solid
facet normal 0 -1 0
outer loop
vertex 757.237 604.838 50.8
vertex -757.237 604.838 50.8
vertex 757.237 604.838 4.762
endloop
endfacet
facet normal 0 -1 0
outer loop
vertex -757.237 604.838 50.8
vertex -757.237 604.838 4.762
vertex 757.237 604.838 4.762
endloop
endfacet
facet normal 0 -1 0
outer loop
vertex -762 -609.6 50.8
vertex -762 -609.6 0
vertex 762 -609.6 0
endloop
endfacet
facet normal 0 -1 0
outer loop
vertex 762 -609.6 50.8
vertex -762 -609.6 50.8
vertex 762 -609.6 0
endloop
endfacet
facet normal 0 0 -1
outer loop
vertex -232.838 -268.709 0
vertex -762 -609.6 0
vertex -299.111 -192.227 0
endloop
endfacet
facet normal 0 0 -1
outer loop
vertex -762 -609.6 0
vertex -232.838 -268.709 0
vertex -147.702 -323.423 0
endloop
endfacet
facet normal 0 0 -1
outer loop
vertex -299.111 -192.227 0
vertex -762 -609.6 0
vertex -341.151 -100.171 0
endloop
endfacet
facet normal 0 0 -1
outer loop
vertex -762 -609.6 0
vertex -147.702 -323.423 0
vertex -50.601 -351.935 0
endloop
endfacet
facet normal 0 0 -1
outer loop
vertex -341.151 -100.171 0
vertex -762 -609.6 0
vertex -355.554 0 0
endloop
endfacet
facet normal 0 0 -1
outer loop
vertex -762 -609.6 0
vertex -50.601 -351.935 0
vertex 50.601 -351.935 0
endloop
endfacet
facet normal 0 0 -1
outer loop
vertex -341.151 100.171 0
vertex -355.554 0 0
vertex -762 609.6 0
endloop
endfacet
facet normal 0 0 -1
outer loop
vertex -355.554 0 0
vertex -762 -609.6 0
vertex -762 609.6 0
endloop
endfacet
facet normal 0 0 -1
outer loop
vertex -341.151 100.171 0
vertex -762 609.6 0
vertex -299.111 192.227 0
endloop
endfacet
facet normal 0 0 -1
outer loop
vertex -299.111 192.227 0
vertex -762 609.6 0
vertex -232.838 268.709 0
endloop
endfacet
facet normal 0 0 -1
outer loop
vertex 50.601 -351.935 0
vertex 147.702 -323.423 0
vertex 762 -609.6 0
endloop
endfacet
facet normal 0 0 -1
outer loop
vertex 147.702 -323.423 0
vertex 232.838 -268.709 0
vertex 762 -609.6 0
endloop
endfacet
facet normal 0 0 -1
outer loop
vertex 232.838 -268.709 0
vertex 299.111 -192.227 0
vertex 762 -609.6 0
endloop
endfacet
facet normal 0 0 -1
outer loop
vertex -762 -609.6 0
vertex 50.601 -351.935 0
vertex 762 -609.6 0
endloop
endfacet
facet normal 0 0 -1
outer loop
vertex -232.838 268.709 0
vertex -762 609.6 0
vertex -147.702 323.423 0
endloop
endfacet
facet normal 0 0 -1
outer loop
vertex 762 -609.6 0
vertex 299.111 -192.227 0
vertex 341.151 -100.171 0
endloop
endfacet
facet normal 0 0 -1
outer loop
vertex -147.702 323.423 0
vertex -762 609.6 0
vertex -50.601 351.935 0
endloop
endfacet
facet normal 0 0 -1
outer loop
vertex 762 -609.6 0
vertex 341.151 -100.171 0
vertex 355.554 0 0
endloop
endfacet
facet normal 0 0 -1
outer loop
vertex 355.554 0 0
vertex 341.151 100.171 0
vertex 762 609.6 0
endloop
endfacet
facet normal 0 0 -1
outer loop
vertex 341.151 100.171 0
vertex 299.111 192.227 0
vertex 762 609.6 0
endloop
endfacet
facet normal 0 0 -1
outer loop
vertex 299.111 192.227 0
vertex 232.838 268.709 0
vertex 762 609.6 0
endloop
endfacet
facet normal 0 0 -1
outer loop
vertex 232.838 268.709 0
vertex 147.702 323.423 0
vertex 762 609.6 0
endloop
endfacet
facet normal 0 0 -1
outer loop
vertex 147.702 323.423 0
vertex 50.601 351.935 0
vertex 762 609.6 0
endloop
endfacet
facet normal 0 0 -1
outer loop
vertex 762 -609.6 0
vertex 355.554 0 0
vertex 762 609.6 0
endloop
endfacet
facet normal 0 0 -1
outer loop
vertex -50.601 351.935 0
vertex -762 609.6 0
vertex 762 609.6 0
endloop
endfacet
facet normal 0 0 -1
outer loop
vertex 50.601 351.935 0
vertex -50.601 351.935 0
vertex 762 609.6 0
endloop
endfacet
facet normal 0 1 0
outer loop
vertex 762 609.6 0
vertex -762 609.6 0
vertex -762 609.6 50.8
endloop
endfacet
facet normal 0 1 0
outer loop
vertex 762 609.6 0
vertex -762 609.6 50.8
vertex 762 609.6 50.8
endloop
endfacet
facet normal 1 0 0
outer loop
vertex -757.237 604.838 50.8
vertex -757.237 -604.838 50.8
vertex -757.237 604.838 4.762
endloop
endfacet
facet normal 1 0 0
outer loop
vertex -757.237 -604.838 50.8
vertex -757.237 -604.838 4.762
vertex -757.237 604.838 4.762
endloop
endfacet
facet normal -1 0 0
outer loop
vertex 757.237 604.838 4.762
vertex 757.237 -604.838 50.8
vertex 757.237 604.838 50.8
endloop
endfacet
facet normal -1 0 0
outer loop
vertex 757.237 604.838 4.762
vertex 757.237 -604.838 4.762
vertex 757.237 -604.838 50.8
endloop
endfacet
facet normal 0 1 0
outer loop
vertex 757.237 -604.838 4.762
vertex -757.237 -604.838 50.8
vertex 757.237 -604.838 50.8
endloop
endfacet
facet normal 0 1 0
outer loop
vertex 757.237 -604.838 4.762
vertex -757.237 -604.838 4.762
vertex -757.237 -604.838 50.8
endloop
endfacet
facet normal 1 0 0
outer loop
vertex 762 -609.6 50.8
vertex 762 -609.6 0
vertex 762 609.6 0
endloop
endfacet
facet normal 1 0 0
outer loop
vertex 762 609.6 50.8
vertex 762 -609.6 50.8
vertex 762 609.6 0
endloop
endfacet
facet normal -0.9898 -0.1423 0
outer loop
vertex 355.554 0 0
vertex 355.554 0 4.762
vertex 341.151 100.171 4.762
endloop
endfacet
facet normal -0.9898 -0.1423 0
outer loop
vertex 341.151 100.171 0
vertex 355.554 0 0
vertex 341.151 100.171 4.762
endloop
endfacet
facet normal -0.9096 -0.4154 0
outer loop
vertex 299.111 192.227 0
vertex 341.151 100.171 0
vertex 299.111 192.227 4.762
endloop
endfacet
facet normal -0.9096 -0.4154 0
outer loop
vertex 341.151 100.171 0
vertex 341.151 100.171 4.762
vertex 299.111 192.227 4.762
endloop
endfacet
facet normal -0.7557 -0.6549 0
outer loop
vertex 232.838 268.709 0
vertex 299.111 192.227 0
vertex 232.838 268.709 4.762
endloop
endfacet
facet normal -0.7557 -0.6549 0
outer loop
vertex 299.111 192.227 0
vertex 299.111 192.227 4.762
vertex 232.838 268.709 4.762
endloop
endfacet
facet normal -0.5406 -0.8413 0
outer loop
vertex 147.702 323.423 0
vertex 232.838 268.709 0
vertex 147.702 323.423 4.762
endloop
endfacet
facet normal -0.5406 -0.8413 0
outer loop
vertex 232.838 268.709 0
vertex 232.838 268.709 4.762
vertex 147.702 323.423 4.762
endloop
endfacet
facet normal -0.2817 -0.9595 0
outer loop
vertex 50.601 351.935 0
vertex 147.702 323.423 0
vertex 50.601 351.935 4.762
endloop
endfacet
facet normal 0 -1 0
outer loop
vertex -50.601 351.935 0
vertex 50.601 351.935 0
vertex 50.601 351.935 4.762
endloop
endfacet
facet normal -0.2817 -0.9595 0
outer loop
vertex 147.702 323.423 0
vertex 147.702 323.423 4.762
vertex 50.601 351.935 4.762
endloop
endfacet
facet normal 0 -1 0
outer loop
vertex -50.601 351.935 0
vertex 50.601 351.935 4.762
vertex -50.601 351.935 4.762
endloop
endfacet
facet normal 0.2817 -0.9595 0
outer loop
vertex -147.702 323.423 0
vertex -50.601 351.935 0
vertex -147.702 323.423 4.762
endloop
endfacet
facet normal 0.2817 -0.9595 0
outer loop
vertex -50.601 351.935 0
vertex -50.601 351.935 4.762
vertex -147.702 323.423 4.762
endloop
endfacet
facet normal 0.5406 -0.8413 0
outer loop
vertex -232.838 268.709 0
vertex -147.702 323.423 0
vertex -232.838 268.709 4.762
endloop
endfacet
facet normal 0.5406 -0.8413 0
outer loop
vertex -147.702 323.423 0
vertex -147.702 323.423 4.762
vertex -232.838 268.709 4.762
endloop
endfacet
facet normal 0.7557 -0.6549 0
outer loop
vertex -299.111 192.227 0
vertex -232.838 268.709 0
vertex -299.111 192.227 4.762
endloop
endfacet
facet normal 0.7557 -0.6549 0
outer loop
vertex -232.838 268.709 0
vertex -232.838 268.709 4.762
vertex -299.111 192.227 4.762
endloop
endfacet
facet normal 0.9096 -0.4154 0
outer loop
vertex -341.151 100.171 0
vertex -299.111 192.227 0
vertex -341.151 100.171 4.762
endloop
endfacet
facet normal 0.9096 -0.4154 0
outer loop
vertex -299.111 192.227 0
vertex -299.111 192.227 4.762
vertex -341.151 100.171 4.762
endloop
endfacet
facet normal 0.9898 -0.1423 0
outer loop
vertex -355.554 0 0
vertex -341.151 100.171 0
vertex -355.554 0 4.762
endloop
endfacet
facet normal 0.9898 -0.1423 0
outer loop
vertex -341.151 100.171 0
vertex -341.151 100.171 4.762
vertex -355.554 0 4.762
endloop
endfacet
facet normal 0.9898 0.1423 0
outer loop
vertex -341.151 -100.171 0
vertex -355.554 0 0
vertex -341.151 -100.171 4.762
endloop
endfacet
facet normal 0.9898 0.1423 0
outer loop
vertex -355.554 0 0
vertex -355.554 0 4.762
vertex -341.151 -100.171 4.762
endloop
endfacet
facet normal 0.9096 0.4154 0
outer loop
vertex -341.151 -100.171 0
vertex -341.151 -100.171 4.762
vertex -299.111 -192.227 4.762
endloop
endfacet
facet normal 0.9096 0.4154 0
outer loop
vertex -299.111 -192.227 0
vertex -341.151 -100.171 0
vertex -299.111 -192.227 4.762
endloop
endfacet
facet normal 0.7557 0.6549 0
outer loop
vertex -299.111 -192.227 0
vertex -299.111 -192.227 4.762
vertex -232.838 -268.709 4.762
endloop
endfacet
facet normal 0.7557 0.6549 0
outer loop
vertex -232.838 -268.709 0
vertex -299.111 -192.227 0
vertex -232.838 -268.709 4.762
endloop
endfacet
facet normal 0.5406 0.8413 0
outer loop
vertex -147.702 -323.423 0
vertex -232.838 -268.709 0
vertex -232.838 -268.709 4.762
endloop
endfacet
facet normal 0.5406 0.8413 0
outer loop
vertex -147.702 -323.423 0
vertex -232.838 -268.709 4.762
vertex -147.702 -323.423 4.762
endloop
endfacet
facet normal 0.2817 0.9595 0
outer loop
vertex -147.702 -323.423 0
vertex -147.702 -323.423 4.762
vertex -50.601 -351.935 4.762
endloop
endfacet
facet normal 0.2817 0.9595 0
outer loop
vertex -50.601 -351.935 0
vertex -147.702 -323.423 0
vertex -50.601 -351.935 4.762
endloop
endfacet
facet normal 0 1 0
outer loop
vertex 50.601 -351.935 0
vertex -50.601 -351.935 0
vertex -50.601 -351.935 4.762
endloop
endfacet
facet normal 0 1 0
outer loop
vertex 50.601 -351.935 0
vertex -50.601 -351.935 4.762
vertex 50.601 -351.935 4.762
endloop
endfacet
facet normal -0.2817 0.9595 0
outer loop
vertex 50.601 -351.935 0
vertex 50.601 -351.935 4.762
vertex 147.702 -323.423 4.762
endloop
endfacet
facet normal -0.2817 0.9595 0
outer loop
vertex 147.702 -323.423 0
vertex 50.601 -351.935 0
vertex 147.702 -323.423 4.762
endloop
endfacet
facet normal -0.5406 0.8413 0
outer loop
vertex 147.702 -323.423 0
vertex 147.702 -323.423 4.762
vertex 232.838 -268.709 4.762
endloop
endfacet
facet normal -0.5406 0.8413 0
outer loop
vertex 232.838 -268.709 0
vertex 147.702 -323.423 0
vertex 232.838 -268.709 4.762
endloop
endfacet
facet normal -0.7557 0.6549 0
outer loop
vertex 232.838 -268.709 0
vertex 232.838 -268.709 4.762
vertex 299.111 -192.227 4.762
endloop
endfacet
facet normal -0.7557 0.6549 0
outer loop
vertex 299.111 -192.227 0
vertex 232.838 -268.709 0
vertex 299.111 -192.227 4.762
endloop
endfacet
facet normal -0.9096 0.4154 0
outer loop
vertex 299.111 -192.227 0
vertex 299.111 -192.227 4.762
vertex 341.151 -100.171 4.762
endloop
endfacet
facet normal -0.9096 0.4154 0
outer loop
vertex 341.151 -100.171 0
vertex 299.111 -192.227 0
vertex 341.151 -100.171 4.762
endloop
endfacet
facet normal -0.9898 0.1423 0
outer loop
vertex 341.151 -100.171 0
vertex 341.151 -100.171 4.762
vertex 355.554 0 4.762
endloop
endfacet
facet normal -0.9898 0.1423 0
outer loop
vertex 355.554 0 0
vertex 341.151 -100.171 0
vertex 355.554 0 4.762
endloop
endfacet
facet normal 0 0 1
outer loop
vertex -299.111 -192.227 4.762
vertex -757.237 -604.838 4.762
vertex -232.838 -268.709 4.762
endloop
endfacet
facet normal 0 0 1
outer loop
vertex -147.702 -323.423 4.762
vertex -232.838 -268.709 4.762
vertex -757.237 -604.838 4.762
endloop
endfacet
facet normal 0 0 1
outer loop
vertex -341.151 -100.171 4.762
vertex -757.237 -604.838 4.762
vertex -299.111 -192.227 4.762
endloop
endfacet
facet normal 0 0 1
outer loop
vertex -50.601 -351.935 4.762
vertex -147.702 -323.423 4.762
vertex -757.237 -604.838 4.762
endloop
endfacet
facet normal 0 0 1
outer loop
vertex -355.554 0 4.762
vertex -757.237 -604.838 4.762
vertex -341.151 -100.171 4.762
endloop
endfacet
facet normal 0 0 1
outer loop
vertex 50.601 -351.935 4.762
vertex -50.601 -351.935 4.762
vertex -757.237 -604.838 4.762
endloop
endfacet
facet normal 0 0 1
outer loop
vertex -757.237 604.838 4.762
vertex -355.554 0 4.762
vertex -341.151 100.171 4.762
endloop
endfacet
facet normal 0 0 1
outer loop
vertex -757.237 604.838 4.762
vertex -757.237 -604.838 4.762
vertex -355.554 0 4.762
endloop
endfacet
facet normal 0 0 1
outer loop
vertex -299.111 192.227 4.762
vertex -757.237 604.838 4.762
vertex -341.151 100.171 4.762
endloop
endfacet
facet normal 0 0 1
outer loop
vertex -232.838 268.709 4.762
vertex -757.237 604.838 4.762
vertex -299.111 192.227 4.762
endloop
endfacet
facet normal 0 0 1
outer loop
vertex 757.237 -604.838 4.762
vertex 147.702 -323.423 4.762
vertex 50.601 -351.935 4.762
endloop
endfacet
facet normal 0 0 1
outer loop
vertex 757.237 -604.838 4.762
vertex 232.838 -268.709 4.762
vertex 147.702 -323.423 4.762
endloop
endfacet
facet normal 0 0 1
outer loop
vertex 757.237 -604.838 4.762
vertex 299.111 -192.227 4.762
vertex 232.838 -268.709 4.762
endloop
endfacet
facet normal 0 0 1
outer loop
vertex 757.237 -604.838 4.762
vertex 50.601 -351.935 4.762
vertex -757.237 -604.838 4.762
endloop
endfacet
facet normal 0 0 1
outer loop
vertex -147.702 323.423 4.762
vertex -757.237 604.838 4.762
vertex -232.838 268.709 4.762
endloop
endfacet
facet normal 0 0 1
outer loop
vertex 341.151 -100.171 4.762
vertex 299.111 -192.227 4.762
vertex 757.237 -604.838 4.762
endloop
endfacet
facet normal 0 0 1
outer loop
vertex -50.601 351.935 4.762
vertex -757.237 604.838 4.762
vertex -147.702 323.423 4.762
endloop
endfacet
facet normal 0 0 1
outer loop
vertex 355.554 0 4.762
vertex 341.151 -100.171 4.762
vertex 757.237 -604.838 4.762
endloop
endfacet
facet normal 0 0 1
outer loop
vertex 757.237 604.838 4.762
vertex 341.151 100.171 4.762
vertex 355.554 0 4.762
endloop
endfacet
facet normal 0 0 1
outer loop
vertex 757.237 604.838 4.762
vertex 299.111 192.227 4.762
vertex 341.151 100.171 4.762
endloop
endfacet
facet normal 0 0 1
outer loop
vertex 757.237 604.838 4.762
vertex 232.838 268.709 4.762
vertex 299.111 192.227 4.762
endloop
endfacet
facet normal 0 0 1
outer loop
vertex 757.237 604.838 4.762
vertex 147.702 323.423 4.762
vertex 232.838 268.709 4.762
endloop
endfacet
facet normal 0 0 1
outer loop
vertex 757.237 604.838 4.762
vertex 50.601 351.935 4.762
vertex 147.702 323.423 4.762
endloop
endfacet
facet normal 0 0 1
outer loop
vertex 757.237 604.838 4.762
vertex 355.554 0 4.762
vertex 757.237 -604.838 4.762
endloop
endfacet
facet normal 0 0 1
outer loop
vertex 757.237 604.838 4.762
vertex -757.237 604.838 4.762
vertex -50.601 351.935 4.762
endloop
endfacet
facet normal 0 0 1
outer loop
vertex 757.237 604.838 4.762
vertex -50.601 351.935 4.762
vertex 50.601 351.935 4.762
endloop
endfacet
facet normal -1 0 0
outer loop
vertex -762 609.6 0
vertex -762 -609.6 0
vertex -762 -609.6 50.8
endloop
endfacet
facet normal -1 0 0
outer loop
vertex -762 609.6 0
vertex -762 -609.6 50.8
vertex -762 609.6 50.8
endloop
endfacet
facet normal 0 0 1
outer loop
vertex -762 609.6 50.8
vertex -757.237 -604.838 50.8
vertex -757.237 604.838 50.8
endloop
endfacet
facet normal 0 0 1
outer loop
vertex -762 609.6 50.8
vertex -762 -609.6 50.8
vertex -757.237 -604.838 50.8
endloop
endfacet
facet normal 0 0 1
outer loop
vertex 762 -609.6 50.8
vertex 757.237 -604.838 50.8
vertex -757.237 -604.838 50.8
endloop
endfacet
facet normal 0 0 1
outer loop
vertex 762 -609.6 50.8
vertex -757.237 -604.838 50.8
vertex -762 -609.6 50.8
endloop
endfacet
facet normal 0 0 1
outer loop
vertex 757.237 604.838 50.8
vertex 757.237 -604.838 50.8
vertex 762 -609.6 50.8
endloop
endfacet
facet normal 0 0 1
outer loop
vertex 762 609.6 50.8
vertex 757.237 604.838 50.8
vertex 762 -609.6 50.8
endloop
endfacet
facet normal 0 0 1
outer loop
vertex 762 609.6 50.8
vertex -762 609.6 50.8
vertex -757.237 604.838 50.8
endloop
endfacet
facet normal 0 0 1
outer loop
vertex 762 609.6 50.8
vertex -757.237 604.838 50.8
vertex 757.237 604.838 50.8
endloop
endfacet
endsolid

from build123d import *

# Parameters (mm, degrees)
F0_W     = 1524
F0_H     = 1219.2
F1_DEPTH = 50.8
F2_T     = -4.7625
F4_R     = 355.553582
F5_DEPTH = 25.4


with BuildPart() as f1:
    # F0 (on Top) → F1 (new body)
    with BuildSketch(Plane.XY):
        Rectangle(F0_W, F0_H)
    extrude(amount=F1_DEPTH)

    # F2
    f2_openings = [f1.faces().sort_by_distance(p)[0] for p in [
        (0, 0, 50.8),
    ]]
    offset(amount=F2_T, openings=f2_openings)

    # F4 (on face) → F5 (cut)
    with BuildSketch(Plane.XY.offset(4.7625)):
        Circle(F4_R)
    extrude(amount=-F5_DEPTH, mode=Mode.SUBTRACT)


solid = f1.part
